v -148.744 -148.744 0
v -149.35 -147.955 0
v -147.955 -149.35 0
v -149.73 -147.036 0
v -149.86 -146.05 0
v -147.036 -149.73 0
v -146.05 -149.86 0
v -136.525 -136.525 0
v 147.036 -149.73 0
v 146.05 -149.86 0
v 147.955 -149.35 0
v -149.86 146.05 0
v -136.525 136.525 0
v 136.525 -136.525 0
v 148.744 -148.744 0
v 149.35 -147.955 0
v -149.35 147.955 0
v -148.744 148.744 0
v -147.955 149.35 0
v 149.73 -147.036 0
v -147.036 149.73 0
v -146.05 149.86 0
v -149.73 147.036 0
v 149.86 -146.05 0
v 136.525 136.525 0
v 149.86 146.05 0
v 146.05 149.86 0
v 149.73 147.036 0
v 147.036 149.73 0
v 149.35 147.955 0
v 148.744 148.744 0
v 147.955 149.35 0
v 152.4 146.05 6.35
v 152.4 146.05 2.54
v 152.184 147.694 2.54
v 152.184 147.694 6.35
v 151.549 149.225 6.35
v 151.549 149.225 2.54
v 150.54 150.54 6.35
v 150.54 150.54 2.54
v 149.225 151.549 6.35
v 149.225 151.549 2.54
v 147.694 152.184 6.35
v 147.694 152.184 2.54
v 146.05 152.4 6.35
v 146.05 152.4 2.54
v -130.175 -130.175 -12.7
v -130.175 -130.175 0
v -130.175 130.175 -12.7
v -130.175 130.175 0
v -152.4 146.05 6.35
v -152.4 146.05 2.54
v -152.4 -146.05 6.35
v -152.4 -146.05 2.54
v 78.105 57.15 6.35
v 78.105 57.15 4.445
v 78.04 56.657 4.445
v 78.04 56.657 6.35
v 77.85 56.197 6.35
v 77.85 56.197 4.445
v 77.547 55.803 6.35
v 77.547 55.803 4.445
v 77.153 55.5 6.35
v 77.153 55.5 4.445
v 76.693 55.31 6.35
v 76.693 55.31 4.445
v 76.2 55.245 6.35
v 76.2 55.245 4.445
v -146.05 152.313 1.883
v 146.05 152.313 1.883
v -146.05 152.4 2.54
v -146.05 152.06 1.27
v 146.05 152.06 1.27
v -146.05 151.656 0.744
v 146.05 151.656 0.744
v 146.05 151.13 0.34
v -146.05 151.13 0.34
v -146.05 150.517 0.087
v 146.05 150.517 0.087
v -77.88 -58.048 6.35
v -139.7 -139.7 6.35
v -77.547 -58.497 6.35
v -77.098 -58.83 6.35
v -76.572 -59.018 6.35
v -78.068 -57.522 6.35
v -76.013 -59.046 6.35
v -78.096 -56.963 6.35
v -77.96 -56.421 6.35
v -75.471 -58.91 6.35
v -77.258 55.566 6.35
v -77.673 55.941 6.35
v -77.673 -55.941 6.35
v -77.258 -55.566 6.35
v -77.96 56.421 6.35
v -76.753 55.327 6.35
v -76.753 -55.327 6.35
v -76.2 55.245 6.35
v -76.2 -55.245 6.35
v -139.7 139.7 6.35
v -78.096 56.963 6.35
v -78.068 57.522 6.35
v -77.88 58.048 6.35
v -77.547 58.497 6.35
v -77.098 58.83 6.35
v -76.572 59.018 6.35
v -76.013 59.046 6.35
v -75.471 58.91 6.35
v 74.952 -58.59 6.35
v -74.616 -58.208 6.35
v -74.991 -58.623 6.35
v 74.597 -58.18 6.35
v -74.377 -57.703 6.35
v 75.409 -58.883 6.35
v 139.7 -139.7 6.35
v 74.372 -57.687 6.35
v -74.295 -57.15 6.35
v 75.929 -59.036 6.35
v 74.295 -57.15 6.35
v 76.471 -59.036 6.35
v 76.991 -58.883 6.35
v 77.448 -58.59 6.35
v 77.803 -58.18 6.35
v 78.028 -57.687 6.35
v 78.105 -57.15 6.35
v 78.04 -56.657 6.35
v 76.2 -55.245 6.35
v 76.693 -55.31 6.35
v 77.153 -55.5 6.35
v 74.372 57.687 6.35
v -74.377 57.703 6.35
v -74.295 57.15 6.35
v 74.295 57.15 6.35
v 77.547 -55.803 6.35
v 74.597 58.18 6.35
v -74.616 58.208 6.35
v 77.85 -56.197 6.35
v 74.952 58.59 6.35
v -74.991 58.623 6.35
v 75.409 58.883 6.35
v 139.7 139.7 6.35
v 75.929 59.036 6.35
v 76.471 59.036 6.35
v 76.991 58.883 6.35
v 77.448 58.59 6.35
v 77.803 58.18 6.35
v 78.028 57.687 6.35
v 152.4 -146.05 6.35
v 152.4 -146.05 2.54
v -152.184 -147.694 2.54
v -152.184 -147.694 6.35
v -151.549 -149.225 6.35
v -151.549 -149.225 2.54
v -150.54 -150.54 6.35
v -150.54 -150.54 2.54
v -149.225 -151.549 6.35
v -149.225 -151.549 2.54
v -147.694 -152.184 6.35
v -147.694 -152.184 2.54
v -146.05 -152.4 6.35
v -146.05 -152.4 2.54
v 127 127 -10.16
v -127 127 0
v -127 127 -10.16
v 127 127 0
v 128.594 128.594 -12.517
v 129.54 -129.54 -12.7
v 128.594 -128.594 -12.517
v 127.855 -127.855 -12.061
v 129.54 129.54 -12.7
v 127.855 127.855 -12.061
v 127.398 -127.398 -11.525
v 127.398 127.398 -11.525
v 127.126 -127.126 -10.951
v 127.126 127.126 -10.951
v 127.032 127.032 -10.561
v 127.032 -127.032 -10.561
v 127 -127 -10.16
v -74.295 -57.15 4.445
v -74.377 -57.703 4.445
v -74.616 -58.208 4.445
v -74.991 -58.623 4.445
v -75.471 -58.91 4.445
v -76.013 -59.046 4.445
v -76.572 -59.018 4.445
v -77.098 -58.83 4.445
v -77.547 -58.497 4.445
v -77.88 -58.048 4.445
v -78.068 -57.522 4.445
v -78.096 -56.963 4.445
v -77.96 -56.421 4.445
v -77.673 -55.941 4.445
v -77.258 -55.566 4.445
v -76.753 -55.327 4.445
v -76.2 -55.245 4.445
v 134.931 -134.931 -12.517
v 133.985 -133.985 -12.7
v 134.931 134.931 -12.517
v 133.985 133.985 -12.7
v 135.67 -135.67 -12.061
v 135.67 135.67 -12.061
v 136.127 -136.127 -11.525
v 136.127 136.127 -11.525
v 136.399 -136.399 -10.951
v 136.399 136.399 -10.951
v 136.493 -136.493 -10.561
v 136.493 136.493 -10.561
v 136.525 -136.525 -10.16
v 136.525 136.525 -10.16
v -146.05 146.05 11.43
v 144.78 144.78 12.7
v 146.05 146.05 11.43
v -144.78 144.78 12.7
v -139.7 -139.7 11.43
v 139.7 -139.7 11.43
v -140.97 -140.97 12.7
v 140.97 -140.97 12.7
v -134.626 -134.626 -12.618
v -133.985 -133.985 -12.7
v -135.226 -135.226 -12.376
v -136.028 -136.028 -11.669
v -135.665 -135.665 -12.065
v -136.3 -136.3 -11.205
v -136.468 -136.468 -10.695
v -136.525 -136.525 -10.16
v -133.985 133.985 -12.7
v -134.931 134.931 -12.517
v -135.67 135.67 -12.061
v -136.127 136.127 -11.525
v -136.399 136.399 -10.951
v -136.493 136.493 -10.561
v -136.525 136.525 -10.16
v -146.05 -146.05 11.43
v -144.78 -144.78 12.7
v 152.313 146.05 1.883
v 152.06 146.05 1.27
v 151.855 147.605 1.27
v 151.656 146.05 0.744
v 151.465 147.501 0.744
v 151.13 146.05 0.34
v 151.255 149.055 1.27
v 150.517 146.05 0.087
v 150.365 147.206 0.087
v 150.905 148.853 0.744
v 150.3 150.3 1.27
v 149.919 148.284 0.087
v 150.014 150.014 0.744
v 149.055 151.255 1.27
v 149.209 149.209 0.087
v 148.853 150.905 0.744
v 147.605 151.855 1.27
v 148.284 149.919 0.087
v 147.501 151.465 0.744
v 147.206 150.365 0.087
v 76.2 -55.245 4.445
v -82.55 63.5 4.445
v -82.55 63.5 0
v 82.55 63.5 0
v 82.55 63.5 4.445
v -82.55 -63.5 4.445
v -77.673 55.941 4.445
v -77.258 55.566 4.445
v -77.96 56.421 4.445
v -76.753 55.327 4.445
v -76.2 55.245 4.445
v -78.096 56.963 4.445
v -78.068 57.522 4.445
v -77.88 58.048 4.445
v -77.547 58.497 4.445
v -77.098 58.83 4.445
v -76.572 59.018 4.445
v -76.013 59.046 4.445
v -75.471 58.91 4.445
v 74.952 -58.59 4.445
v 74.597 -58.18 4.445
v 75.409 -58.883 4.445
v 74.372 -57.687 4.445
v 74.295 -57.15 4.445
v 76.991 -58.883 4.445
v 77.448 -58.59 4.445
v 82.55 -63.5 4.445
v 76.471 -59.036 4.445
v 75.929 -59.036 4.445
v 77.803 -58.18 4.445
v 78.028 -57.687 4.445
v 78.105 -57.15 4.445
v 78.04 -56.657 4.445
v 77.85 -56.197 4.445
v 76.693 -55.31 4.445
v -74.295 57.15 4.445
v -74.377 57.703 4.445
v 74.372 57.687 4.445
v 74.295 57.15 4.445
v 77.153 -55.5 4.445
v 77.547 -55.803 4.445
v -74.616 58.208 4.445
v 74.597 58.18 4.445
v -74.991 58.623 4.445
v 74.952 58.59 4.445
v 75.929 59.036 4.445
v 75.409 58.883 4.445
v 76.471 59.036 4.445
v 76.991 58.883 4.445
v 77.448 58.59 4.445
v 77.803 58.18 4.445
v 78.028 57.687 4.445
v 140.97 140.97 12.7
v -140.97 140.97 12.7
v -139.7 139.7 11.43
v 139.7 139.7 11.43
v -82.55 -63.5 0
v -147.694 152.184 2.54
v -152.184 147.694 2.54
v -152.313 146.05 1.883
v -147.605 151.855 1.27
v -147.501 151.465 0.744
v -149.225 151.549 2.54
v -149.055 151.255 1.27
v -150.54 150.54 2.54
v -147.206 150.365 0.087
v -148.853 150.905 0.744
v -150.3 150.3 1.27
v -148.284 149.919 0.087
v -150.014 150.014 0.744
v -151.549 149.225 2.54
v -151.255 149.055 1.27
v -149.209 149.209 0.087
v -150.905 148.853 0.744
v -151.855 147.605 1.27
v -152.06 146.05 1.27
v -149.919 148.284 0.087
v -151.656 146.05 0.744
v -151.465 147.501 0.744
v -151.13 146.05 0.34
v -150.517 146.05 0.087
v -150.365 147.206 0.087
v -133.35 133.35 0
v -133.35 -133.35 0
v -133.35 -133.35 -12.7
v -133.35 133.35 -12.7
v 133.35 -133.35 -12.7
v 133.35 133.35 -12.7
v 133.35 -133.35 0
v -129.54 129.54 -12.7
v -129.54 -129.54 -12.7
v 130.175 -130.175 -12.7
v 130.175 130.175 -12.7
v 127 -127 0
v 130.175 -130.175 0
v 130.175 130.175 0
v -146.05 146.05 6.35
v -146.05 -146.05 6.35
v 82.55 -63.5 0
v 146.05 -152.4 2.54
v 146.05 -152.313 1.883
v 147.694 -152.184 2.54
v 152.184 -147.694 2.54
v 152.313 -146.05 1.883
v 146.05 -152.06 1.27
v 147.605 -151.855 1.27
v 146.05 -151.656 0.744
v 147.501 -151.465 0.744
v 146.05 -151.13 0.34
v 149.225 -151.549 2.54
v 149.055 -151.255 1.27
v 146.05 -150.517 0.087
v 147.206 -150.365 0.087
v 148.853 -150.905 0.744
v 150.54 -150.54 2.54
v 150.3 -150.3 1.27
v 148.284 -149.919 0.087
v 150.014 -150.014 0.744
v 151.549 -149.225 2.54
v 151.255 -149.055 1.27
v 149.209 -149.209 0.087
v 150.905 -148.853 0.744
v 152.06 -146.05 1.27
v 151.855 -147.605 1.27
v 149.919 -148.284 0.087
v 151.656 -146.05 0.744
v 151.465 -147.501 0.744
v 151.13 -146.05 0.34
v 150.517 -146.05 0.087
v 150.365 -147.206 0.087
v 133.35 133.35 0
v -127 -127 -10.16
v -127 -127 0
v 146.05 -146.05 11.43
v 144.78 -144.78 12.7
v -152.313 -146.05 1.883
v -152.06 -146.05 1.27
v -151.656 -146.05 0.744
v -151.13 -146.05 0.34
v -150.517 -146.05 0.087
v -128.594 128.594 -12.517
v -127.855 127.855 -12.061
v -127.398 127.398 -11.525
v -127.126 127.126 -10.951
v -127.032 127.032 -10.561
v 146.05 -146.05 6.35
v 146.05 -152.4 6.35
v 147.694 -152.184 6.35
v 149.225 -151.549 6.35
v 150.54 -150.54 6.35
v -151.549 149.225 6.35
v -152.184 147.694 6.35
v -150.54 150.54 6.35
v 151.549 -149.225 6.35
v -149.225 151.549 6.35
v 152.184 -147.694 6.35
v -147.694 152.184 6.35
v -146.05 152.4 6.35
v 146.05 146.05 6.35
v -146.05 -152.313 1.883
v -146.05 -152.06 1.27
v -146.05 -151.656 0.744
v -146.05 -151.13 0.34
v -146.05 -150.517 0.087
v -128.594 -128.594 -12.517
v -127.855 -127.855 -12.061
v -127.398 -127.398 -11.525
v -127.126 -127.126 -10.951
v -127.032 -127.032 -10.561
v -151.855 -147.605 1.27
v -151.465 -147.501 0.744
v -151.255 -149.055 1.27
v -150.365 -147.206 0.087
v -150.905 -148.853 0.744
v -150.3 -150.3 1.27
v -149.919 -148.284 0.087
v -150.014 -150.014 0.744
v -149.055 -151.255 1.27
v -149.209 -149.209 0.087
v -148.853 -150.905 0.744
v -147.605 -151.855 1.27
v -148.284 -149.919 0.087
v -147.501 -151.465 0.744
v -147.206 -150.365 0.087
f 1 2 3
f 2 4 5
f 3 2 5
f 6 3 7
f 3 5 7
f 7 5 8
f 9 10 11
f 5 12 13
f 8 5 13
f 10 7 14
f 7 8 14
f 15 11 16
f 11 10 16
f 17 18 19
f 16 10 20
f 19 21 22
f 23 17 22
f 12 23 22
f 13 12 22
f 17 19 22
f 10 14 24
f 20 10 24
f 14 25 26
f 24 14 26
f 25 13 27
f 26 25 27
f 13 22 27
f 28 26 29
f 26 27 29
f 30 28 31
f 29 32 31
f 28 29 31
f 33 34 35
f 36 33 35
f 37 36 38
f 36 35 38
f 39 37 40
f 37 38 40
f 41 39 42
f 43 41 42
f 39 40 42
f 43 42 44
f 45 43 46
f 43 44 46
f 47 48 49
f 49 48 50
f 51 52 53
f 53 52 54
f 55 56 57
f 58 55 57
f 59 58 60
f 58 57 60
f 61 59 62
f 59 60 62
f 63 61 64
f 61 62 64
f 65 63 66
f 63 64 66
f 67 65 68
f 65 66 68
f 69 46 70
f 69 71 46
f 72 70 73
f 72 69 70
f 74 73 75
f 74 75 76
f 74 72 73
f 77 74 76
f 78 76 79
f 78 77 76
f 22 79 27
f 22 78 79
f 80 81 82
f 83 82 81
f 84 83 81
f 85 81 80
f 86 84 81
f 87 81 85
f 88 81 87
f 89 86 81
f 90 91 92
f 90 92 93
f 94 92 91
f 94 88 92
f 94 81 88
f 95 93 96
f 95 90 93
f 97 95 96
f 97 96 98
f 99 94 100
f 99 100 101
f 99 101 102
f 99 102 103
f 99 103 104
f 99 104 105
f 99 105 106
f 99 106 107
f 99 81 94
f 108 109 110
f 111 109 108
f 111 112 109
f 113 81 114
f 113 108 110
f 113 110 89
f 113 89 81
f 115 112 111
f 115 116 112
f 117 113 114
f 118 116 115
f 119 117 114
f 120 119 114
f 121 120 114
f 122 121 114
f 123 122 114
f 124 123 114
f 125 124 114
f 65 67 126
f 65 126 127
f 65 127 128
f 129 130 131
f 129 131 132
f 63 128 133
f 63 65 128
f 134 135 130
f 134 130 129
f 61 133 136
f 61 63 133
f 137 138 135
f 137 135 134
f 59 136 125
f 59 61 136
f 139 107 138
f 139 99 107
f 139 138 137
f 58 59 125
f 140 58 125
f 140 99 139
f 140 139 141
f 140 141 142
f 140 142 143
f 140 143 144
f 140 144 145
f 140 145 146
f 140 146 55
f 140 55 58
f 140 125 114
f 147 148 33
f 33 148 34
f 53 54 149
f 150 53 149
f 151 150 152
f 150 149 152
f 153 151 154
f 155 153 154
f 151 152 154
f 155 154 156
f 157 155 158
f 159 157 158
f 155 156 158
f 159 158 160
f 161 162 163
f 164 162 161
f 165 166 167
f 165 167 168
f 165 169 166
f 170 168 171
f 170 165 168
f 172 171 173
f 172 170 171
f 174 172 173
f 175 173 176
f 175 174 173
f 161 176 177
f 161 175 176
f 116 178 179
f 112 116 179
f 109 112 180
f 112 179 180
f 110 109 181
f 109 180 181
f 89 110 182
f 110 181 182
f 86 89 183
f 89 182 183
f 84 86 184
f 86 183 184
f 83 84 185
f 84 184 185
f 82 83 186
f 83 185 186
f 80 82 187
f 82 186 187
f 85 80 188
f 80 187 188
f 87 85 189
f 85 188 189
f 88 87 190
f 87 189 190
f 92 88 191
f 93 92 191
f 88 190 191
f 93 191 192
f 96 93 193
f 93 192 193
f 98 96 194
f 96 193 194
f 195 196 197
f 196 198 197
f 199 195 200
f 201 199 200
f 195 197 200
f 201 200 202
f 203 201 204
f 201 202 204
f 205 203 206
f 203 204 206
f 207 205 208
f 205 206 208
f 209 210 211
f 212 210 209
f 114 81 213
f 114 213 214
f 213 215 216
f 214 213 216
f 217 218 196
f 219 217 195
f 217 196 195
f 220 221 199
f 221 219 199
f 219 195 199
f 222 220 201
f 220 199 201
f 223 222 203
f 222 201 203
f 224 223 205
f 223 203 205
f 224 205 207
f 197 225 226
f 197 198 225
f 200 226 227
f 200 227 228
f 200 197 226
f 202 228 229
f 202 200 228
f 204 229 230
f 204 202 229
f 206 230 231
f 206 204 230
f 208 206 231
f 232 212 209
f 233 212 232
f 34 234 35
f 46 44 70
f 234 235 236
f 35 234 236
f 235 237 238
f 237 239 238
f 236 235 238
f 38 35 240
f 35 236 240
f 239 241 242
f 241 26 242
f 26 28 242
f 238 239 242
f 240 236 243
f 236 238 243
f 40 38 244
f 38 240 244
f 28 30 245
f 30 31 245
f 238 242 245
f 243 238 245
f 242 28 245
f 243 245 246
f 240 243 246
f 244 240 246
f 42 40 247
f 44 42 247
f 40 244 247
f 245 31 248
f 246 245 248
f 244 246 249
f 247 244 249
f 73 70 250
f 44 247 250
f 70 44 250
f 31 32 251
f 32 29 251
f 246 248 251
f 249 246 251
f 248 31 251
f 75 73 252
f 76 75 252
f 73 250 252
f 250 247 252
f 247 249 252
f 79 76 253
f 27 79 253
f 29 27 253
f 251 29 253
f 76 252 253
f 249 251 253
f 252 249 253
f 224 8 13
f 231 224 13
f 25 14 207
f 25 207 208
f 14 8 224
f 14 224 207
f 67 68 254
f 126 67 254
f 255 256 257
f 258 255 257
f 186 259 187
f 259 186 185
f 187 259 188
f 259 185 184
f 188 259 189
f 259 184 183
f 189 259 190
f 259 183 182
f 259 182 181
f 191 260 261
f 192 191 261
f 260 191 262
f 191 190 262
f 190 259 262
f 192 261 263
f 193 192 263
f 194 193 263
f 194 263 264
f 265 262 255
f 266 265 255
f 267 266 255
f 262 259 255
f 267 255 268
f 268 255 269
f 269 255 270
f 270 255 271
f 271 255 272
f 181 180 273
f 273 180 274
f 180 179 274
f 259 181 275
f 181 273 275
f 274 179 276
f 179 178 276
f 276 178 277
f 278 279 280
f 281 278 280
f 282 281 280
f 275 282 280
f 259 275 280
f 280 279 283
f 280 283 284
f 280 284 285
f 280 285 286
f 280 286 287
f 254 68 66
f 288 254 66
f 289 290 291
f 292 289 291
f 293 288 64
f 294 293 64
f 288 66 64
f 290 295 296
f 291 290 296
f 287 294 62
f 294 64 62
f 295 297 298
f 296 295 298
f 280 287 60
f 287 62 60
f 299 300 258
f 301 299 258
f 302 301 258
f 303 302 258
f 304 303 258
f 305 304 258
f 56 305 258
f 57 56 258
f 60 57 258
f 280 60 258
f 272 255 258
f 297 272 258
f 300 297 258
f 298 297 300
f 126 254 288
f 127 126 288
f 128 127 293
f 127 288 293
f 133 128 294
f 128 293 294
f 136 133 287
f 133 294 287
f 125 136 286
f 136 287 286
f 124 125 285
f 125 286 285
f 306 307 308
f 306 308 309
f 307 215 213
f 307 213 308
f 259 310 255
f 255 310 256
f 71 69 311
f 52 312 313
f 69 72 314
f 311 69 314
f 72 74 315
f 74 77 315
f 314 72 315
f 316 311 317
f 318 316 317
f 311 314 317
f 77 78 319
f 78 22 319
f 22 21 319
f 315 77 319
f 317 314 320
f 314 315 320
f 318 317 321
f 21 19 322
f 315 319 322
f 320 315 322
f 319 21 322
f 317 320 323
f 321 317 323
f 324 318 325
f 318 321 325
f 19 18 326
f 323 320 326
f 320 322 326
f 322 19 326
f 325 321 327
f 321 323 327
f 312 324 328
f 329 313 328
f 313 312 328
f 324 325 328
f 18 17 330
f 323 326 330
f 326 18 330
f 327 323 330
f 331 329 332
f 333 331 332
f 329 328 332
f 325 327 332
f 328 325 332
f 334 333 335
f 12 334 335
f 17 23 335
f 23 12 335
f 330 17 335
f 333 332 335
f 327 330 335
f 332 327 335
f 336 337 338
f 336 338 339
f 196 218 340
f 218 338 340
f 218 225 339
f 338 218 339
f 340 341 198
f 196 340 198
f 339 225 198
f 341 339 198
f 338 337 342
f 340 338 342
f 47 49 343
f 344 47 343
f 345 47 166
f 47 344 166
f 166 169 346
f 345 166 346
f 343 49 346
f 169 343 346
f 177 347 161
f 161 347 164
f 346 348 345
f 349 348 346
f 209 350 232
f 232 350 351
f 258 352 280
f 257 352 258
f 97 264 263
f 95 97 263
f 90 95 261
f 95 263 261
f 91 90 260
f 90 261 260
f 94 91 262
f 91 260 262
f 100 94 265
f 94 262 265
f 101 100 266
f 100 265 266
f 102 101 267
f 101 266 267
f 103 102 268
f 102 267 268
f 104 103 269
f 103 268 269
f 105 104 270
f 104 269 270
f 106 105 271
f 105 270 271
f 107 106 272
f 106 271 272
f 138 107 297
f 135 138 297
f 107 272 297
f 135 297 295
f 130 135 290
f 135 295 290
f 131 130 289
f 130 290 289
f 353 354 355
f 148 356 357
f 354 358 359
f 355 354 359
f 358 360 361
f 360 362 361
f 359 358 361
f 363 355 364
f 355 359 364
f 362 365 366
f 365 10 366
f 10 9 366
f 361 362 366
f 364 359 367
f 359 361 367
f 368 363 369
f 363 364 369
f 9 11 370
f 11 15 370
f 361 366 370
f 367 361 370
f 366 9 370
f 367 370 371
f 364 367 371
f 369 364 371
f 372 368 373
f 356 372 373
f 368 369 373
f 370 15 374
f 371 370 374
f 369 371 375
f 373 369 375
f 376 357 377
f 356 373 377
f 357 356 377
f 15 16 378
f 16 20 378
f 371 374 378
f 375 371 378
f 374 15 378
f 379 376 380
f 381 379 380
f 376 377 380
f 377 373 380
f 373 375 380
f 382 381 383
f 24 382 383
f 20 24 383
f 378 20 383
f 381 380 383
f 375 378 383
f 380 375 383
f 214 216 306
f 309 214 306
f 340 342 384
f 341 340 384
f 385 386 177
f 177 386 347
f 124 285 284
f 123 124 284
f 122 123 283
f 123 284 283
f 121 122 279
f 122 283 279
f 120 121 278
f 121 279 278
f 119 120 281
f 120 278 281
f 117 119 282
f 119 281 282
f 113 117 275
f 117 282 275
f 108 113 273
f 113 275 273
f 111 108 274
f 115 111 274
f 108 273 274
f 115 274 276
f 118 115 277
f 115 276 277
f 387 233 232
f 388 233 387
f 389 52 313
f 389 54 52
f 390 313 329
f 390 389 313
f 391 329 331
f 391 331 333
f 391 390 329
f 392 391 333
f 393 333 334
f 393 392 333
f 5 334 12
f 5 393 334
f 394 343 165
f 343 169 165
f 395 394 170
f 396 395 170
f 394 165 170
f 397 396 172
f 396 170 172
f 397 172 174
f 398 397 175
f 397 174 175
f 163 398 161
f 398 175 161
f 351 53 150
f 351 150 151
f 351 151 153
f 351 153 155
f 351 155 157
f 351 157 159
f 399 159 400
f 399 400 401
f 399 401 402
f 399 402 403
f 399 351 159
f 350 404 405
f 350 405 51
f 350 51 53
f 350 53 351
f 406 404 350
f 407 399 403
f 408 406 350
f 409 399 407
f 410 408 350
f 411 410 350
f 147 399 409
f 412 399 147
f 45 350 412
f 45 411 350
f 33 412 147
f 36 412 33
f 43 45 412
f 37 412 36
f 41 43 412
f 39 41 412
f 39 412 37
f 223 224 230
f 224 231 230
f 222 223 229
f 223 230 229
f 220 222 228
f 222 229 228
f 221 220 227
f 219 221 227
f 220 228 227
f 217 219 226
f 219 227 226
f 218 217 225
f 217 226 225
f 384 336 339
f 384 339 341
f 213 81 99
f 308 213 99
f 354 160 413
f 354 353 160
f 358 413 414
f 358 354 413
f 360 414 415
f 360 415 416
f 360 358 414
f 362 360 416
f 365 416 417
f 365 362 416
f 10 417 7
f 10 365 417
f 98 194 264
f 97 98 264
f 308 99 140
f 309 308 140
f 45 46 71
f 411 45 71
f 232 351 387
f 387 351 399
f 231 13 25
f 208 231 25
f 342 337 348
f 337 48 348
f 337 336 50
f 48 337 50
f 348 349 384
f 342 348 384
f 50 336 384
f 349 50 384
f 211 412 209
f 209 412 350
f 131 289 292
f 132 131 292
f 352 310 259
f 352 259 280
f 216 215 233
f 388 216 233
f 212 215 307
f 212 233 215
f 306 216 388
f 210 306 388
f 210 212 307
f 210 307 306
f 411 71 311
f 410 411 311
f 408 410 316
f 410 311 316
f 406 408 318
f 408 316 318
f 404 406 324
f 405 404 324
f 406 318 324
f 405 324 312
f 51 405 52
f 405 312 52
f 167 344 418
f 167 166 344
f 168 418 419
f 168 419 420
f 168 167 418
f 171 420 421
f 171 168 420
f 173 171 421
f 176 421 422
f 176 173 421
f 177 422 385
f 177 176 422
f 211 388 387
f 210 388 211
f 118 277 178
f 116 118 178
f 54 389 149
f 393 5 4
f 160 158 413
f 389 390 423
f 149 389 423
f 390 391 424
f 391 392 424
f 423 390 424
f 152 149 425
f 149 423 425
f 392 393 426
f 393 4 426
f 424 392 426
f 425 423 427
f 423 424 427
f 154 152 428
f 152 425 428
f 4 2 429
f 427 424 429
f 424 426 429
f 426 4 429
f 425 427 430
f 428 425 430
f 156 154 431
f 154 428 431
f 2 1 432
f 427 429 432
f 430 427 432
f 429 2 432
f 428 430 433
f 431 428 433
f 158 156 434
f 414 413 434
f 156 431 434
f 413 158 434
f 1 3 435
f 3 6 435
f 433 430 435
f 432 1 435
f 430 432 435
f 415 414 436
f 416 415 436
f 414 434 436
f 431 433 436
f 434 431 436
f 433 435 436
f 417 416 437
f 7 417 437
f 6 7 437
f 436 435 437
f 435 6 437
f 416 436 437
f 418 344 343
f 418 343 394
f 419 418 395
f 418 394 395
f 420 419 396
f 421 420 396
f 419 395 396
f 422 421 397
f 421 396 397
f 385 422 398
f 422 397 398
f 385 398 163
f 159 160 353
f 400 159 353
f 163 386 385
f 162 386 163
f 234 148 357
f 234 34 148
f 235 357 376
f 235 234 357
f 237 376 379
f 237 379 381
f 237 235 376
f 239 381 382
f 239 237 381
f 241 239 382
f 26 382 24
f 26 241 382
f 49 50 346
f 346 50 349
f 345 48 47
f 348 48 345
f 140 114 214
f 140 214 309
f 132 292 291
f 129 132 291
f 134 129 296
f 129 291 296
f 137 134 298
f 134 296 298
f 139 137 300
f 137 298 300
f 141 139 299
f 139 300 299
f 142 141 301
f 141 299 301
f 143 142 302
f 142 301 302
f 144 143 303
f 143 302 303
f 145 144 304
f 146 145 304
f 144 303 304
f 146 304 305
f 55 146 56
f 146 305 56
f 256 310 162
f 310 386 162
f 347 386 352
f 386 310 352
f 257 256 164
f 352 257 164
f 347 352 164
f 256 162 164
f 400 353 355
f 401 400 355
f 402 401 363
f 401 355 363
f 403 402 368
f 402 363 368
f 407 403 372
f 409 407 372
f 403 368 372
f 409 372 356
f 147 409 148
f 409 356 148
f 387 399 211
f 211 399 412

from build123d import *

# Parameters (mm, degrees)
F0_W     = 279.4
F0_H     = 279.4
F0_W_2   = 273.05
F0_H_2   = 273.05
F0_W_3   = 266.7
F0_H_3   = 266.7
F0_W_4   = 260.35
F0_H_4   = 260.35
F0_W_5   = 254
F0_H_5   = 254
F1_DEPTH = 6.35
F2_DEPTH = 12.7
F3_SIZE  = 1.27
F4_R     = 2.54
F5_DEPTH = 12.7
F6_R     = 2.54
F0_W_6   = 165.1
F0_H_6   = 127
F7_DEPTH = 6.35
F8_DEPTH = 4.445


with BuildPart() as f1:
    # F0 (on Top) → F1 (new body)
    with BuildSketch(Plane.XY):
        with BuildLine():
            Line((-139.7, -146.05), (139.7, -146.05))
            ThreePointArc((139.7, -146.05), (141.5598719395, -141.5598719395), (146.05, -139.7))
            Line((146.05, -139.7), (146.05, 139.7))
            ThreePointArc((146.05, 139.7), (141.5598719395, 141.5598719395), (139.7, 146.05))
            Line((139.7, 146.05), (-139.7, 146.05))
            ThreePointArc((-139.7, 146.05), (-141.5598719395, 141.5598719395), (-146.05, 139.7))
            Line((-146.05, 139.7), (-146.05, -139.7))
            ThreePointArc((-146.05, -139.7), (-141.5598719395, -141.5598719395), (-139.7, -146.05))
        make_face()
        Rectangle(F0_W, F0_H, mode=Mode.SUBTRACT)
        Rectangle(F0_W, F0_H)
        Rectangle(F0_W_2, F0_H_2, mode=Mode.SUBTRACT)
        Rectangle(F0_W_2, F0_H_2)
        Rectangle(F0_W_3, F0_H_3, mode=Mode.SUBTRACT)
        Rectangle(F0_W_3, F0_H_3)
        Rectangle(F0_W_4, F0_H_4, mode=Mode.SUBTRACT)
        Rectangle(F0_W_4, F0_H_4)
        Rectangle(F0_W_5, F0_H_5, mode=Mode.SUBTRACT)
        with BuildLine():
            Line((-146.049999995, -152.4), (146.05, -152.4))
            ThreePointArc((146.05, -152.4), (141.5598719395, -150.5401280605), (139.7, -146.05))
            Line((139.7, -146.05), (-139.7, -146.05))
            ThreePointArc((-139.7, -146.05), (-141.5598719377, -150.5401280588), (-146.049999995, -152.4))
        make_face()
        with BuildLine():
            ThreePointArc((139.7, 146.05), (141.5598719395, 150.5401280605), (146.05, 152.4))
            Line((146.05, 152.4), (-146.0500000019, 152.4))
            ThreePointArc((-146.0500000019, 152.4), (-141.5598719401, 150.5401280612), (-139.7, 146.05))
            Line((-139.7, 146.05), (139.7, 146.05))
        make_face()
        with BuildLine():
            ThreePointArc((146.05, -139.7), (150.5401280605, -141.5598719395), (152.4, -146.05))
            Line((152.4, -146.05), (152.4, 146.05))
            ThreePointArc((152.4, 146.05), (150.5401280605, 141.5598719395), (146.05, 139.7))
            Line((146.05, 139.7), (146.05, -139.7))
        make_face()
        with BuildLine():
            Line((-152.4, 146.0500002439), (-152.4, -146.05))
            ThreePointArc((-152.4, -146.05), (-150.5401280605, -141.5598719395), (-146.05, -139.7))
            Line((-146.05, -139.7), (-146.05, 139.7))
            ThreePointArc((-146.05, 139.7), (-150.5401281468, 141.5598720257), (-152.4, 146.0500002439))
        make_face()
        with BuildLine():
            ThreePointArc((139.7, -146.05), (141.5598719395, -150.5401280605), (146.05, -152.4))
            ThreePointArc((146.05, -152.4), (150.5401280605, -150.5401280605), (152.4, -146.05))
            ThreePointArc((152.4, -146.05), (150.5401280605, -141.5598719395), (146.05, -139.7))
            Line((146.05, -139.7), (146.05, -146.05))
            Line((146.05, -146.05), (139.7, -146.05))
        make_face()
        with BuildLine():
            ThreePointArc((-152.4, -146.05), (-150.5401280588, -150.5401280623), (-146.049999995, -152.4))
            ThreePointArc((-146.049999995, -152.4), (-141.5598719377, -150.5401280588), (-139.7, -146.05))
            Line((-139.7, -146.05), (-146.05, -146.05))
            Line((-146.05, -146.05), (-146.05, -139.7))
            ThreePointArc((-146.05, -139.7), (-150.5401280605, -141.5598719395), (-152.4, -146.05))
        make_face()
        with BuildLine():
            ThreePointArc((146.05, 139.7), (150.5401280605, 141.5598719395), (152.4, 146.05))
            ThreePointArc((152.4, 146.05), (150.5401280605, 150.5401280605), (146.05, 152.4))
            ThreePointArc((146.05, 152.4), (141.5598719395, 150.5401280605), (139.7, 146.05))
            Line((139.7, 146.05), (146.05, 146.05))
            Line((146.05, 146.05), (146.05, 139.7))
        make_face()
        with BuildLine():
            ThreePointArc((-146.0500000019, 152.4), (-150.540127975, 150.5401281461), (-152.4, 146.0500002439))
            ThreePointArc((-152.4, 146.0500002439), (-150.5401281468, 141.5598720257), (-146.05, 139.7))
            Line((-146.05, 139.7), (-146.05, 146.05))
            Line((-146.05, 146.05), (-139.7, 146.05))
            ThreePointArc((-139.7, 146.05), (-141.5598719401, 150.5401280612), (-146.0500000019, 152.4))
        make_face()
        with BuildLine():
            Line((-146.05, -146.05), (-139.7, -146.05))
            ThreePointArc((-139.7, -146.05), (-141.5598719395, -141.5598719395), (-146.05, -139.7))
            Line((-146.05, -139.7), (-146.05, -146.05))
        make_face()
        with BuildLine():
            ThreePointArc((139.7, 146.05), (141.5598719395, 141.5598719395), (146.05, 139.7))
            Line((146.05, 139.7), (146.05, 146.05))
            Line((146.05, 146.05), (139.7, 146.05))
        make_face()
        with BuildLine():
            Line((-146.05, 146.05), (-146.05, 139.7))
            ThreePointArc((-146.05, 139.7), (-141.5598719395, 141.5598719395), (-139.7, 146.05))
            Line((-139.7, 146.05), (-146.05, 146.05))
        make_face()
        with BuildLine():
            ThreePointArc((146.05, -139.7), (141.5598719395, -141.5598719395), (139.7, -146.05))
            Line((139.7, -146.05), (146.05, -146.05))
            Line((146.05, -146.05), (146.05, -139.7))
        make_face()
    extrude(amount=F1_DEPTH)

    # F0 (on Top) → F2 (join)
    with BuildSketch(Plane.XY):
        with BuildLine():
            Line((-139.7, -146.05), (139.7, -146.05))
            ThreePointArc((139.7, -146.05), (141.5598719395, -141.5598719395), (146.05, -139.7))
            Line((146.05, -139.7), (146.05, 139.7))
            ThreePointArc((146.05, 139.7), (141.5598719395, 141.5598719395), (139.7, 146.05))
            Line((139.7, 146.05), (-139.7, 146.05))
            ThreePointArc((-139.7, 146.05), (-141.5598719395, 141.5598719395), (-146.05, 139.7))
            Line((-146.05, 139.7), (-146.05, -139.7))
            ThreePointArc((-146.05, -139.7), (-141.5598719395, -141.5598719395), (-139.7, -146.05))
        make_face()
        Rectangle(F0_W, F0_H, mode=Mode.SUBTRACT)
        with BuildLine():
            Line((-146.05, 146.05), (-146.05, 139.7))
            ThreePointArc((-146.05, 139.7), (-141.5598719395, 141.5598719395), (-139.7, 146.05))
            Line((-139.7, 146.05), (-146.05, 146.05))
        make_face()
        with BuildLine():
            Line((-146.05, -146.05), (-139.7, -146.05))
            ThreePointArc((-139.7, -146.05), (-141.5598719395, -141.5598719395), (-146.05, -139.7))
            Line((-146.05, -139.7), (-146.05, -146.05))
        make_face()
        with BuildLine():
            ThreePointArc((146.05, -139.7), (141.5598719395, -141.5598719395), (139.7, -146.05))
            Line((139.7, -146.05), (146.05, -146.05))
            Line((146.05, -146.05), (146.05, -139.7))
        make_face()
        with BuildLine():
            ThreePointArc((139.7, 146.05), (141.5598719395, 141.5598719395), (146.05, 139.7))
            Line((146.05, 139.7), (146.05, 146.05))
            Line((146.05, 146.05), (139.7, 146.05))
        make_face()
    extrude(amount=F2_DEPTH)

    # F3
    f3_edges = [f1.edges().sort_by_distance(p)[0] for p in [
        (146.05, 0, 12.7),
        (139.7, 0, 12.7),
        (0, 139.7, 12.7),
        (0, 146.05, 12.7),
        (-139.7, 0, 12.7),
        (-146.05, 0, 12.7),
        (0, -139.7, 12.7),
        (0, -146.05, 12.7),
    ]]
    chamfer(f3_edges, length=F3_SIZE)

    # F4
    f4_edges = [f1.edges().sort_by_distance(p)[0] for p in [
        (0, -152.4, 0),
        (-152.4, 0, 0),
        (-150.540128, -150.540128, 0),
        (152.4, 0, 0),
        (150.540128, -150.540128, 0),
        (0, 152.4, 0),
        (-150.540128, 150.540128, 0),
        (150.540128, 150.540128, 0),
    ]]
    fillet(f4_edges, radius=F4_R)

    # F0 (on Top) → F5 (join)
    with BuildSketch(Plane.XY):
        Rectangle(F0_W_2, F0_H_2)
        Rectangle(F0_W_3, F0_H_3, mode=Mode.SUBTRACT)
        Rectangle(F0_W_4, F0_H_4)
        Rectangle(F0_W_5, F0_H_5, mode=Mode.SUBTRACT)
    extrude(amount=-F5_DEPTH)

    # F6
    f6_edges = [f1.edges().sort_by_distance(p)[0] for p in [
        (0, 136.525, -12.7),
        (-136.525, 0, -12.7),
        (0, -136.525, -12.7),
        (136.525, 0, -12.7),
        (0, 127, -12.7),
        (-127, 0, -12.7),
        (0, -127, -12.7),
        (127, 0, -12.7),
    ]]
    fillet(f6_edges, radius=F6_R)

    # F0 (on Top) → F7 (join)
    with BuildSketch(Plane.XY):
        Rectangle(F0_W_5, F0_H_5)
        Rectangle(F0_W_6, F0_H_6, mode=Mode.SUBTRACT)
        Rectangle(F0_W_6, F0_H_6)
        with BuildLine():
            ThreePointArc((-76.2, 55.245), (-77.5470384182, 58.4970384182), (-74.295, 57.15))
            Line((-74.295, 57.15), (74.295, 57.15))
            ThreePointArc((74.295, 57.15), (76.2, 59.055), (78.105, 57.15))
            ThreePointArc((78.105, 57.15), (77.5470384182, 55.8029615818), (76.2, 55.245))
            Line((76.2, 55.245), (76.2, -55.245))
            ThreePointArc((76.2, -55.245), (77.5470384182, -55.8029615818), (78.105, -57.15))
            ThreePointArc((78.105, -57.15), (76.2, -59.055), (74.295, -57.15))
            Line((74.295, -57.15), (-74.295, -57.15))
            ThreePointArc((-74.295, -57.15), (-77.5470384182, -58.4970384182), (-76.2, -55.245))
            Line((-76.2, -55.245), (-76.2, 55.245))
        make_face(mode=Mode.SUBTRACT)
    extrude(amount=F7_DEPTH)

    # F0 (on Top) → F8 (cut)
    with BuildSketch(Plane.XY):
        Rectangle(F0_W_6, F0_H_6)
        with BuildLine():
            ThreePointArc((-76.2, 55.245), (-77.5470384182, 58.4970384182), (-74.295, 57.15))
            Line((-74.295, 57.15), (74.295, 57.15))
            ThreePointArc((74.295, 57.15), (76.2, 59.055), (78.105, 57.15))
            ThreePointArc((78.105, 57.15), (77.5470384182, 55.8029615818), (76.2, 55.245))
            Line((76.2, 55.245), (76.2, -55.245))
            ThreePointArc((76.2, -55.245), (77.5470384182, -55.8029615818), (78.105, -57.15))
            ThreePointArc((78.105, -57.15), (76.2, -59.055), (74.295, -57.15))
            Line((74.295, -57.15), (-74.295, -57.15))
            ThreePointArc((-74.295, -57.15), (-77.5470384182, -58.4970384182), (-76.2, -55.245))
            Line((-76.2, -55.245), (-76.2, 55.245))
        make_face(mode=Mode.SUBTRACT)
    extrude(amount=F8_DEPTH, mode=Mode.SUBTRACT)


solid = f1.part
